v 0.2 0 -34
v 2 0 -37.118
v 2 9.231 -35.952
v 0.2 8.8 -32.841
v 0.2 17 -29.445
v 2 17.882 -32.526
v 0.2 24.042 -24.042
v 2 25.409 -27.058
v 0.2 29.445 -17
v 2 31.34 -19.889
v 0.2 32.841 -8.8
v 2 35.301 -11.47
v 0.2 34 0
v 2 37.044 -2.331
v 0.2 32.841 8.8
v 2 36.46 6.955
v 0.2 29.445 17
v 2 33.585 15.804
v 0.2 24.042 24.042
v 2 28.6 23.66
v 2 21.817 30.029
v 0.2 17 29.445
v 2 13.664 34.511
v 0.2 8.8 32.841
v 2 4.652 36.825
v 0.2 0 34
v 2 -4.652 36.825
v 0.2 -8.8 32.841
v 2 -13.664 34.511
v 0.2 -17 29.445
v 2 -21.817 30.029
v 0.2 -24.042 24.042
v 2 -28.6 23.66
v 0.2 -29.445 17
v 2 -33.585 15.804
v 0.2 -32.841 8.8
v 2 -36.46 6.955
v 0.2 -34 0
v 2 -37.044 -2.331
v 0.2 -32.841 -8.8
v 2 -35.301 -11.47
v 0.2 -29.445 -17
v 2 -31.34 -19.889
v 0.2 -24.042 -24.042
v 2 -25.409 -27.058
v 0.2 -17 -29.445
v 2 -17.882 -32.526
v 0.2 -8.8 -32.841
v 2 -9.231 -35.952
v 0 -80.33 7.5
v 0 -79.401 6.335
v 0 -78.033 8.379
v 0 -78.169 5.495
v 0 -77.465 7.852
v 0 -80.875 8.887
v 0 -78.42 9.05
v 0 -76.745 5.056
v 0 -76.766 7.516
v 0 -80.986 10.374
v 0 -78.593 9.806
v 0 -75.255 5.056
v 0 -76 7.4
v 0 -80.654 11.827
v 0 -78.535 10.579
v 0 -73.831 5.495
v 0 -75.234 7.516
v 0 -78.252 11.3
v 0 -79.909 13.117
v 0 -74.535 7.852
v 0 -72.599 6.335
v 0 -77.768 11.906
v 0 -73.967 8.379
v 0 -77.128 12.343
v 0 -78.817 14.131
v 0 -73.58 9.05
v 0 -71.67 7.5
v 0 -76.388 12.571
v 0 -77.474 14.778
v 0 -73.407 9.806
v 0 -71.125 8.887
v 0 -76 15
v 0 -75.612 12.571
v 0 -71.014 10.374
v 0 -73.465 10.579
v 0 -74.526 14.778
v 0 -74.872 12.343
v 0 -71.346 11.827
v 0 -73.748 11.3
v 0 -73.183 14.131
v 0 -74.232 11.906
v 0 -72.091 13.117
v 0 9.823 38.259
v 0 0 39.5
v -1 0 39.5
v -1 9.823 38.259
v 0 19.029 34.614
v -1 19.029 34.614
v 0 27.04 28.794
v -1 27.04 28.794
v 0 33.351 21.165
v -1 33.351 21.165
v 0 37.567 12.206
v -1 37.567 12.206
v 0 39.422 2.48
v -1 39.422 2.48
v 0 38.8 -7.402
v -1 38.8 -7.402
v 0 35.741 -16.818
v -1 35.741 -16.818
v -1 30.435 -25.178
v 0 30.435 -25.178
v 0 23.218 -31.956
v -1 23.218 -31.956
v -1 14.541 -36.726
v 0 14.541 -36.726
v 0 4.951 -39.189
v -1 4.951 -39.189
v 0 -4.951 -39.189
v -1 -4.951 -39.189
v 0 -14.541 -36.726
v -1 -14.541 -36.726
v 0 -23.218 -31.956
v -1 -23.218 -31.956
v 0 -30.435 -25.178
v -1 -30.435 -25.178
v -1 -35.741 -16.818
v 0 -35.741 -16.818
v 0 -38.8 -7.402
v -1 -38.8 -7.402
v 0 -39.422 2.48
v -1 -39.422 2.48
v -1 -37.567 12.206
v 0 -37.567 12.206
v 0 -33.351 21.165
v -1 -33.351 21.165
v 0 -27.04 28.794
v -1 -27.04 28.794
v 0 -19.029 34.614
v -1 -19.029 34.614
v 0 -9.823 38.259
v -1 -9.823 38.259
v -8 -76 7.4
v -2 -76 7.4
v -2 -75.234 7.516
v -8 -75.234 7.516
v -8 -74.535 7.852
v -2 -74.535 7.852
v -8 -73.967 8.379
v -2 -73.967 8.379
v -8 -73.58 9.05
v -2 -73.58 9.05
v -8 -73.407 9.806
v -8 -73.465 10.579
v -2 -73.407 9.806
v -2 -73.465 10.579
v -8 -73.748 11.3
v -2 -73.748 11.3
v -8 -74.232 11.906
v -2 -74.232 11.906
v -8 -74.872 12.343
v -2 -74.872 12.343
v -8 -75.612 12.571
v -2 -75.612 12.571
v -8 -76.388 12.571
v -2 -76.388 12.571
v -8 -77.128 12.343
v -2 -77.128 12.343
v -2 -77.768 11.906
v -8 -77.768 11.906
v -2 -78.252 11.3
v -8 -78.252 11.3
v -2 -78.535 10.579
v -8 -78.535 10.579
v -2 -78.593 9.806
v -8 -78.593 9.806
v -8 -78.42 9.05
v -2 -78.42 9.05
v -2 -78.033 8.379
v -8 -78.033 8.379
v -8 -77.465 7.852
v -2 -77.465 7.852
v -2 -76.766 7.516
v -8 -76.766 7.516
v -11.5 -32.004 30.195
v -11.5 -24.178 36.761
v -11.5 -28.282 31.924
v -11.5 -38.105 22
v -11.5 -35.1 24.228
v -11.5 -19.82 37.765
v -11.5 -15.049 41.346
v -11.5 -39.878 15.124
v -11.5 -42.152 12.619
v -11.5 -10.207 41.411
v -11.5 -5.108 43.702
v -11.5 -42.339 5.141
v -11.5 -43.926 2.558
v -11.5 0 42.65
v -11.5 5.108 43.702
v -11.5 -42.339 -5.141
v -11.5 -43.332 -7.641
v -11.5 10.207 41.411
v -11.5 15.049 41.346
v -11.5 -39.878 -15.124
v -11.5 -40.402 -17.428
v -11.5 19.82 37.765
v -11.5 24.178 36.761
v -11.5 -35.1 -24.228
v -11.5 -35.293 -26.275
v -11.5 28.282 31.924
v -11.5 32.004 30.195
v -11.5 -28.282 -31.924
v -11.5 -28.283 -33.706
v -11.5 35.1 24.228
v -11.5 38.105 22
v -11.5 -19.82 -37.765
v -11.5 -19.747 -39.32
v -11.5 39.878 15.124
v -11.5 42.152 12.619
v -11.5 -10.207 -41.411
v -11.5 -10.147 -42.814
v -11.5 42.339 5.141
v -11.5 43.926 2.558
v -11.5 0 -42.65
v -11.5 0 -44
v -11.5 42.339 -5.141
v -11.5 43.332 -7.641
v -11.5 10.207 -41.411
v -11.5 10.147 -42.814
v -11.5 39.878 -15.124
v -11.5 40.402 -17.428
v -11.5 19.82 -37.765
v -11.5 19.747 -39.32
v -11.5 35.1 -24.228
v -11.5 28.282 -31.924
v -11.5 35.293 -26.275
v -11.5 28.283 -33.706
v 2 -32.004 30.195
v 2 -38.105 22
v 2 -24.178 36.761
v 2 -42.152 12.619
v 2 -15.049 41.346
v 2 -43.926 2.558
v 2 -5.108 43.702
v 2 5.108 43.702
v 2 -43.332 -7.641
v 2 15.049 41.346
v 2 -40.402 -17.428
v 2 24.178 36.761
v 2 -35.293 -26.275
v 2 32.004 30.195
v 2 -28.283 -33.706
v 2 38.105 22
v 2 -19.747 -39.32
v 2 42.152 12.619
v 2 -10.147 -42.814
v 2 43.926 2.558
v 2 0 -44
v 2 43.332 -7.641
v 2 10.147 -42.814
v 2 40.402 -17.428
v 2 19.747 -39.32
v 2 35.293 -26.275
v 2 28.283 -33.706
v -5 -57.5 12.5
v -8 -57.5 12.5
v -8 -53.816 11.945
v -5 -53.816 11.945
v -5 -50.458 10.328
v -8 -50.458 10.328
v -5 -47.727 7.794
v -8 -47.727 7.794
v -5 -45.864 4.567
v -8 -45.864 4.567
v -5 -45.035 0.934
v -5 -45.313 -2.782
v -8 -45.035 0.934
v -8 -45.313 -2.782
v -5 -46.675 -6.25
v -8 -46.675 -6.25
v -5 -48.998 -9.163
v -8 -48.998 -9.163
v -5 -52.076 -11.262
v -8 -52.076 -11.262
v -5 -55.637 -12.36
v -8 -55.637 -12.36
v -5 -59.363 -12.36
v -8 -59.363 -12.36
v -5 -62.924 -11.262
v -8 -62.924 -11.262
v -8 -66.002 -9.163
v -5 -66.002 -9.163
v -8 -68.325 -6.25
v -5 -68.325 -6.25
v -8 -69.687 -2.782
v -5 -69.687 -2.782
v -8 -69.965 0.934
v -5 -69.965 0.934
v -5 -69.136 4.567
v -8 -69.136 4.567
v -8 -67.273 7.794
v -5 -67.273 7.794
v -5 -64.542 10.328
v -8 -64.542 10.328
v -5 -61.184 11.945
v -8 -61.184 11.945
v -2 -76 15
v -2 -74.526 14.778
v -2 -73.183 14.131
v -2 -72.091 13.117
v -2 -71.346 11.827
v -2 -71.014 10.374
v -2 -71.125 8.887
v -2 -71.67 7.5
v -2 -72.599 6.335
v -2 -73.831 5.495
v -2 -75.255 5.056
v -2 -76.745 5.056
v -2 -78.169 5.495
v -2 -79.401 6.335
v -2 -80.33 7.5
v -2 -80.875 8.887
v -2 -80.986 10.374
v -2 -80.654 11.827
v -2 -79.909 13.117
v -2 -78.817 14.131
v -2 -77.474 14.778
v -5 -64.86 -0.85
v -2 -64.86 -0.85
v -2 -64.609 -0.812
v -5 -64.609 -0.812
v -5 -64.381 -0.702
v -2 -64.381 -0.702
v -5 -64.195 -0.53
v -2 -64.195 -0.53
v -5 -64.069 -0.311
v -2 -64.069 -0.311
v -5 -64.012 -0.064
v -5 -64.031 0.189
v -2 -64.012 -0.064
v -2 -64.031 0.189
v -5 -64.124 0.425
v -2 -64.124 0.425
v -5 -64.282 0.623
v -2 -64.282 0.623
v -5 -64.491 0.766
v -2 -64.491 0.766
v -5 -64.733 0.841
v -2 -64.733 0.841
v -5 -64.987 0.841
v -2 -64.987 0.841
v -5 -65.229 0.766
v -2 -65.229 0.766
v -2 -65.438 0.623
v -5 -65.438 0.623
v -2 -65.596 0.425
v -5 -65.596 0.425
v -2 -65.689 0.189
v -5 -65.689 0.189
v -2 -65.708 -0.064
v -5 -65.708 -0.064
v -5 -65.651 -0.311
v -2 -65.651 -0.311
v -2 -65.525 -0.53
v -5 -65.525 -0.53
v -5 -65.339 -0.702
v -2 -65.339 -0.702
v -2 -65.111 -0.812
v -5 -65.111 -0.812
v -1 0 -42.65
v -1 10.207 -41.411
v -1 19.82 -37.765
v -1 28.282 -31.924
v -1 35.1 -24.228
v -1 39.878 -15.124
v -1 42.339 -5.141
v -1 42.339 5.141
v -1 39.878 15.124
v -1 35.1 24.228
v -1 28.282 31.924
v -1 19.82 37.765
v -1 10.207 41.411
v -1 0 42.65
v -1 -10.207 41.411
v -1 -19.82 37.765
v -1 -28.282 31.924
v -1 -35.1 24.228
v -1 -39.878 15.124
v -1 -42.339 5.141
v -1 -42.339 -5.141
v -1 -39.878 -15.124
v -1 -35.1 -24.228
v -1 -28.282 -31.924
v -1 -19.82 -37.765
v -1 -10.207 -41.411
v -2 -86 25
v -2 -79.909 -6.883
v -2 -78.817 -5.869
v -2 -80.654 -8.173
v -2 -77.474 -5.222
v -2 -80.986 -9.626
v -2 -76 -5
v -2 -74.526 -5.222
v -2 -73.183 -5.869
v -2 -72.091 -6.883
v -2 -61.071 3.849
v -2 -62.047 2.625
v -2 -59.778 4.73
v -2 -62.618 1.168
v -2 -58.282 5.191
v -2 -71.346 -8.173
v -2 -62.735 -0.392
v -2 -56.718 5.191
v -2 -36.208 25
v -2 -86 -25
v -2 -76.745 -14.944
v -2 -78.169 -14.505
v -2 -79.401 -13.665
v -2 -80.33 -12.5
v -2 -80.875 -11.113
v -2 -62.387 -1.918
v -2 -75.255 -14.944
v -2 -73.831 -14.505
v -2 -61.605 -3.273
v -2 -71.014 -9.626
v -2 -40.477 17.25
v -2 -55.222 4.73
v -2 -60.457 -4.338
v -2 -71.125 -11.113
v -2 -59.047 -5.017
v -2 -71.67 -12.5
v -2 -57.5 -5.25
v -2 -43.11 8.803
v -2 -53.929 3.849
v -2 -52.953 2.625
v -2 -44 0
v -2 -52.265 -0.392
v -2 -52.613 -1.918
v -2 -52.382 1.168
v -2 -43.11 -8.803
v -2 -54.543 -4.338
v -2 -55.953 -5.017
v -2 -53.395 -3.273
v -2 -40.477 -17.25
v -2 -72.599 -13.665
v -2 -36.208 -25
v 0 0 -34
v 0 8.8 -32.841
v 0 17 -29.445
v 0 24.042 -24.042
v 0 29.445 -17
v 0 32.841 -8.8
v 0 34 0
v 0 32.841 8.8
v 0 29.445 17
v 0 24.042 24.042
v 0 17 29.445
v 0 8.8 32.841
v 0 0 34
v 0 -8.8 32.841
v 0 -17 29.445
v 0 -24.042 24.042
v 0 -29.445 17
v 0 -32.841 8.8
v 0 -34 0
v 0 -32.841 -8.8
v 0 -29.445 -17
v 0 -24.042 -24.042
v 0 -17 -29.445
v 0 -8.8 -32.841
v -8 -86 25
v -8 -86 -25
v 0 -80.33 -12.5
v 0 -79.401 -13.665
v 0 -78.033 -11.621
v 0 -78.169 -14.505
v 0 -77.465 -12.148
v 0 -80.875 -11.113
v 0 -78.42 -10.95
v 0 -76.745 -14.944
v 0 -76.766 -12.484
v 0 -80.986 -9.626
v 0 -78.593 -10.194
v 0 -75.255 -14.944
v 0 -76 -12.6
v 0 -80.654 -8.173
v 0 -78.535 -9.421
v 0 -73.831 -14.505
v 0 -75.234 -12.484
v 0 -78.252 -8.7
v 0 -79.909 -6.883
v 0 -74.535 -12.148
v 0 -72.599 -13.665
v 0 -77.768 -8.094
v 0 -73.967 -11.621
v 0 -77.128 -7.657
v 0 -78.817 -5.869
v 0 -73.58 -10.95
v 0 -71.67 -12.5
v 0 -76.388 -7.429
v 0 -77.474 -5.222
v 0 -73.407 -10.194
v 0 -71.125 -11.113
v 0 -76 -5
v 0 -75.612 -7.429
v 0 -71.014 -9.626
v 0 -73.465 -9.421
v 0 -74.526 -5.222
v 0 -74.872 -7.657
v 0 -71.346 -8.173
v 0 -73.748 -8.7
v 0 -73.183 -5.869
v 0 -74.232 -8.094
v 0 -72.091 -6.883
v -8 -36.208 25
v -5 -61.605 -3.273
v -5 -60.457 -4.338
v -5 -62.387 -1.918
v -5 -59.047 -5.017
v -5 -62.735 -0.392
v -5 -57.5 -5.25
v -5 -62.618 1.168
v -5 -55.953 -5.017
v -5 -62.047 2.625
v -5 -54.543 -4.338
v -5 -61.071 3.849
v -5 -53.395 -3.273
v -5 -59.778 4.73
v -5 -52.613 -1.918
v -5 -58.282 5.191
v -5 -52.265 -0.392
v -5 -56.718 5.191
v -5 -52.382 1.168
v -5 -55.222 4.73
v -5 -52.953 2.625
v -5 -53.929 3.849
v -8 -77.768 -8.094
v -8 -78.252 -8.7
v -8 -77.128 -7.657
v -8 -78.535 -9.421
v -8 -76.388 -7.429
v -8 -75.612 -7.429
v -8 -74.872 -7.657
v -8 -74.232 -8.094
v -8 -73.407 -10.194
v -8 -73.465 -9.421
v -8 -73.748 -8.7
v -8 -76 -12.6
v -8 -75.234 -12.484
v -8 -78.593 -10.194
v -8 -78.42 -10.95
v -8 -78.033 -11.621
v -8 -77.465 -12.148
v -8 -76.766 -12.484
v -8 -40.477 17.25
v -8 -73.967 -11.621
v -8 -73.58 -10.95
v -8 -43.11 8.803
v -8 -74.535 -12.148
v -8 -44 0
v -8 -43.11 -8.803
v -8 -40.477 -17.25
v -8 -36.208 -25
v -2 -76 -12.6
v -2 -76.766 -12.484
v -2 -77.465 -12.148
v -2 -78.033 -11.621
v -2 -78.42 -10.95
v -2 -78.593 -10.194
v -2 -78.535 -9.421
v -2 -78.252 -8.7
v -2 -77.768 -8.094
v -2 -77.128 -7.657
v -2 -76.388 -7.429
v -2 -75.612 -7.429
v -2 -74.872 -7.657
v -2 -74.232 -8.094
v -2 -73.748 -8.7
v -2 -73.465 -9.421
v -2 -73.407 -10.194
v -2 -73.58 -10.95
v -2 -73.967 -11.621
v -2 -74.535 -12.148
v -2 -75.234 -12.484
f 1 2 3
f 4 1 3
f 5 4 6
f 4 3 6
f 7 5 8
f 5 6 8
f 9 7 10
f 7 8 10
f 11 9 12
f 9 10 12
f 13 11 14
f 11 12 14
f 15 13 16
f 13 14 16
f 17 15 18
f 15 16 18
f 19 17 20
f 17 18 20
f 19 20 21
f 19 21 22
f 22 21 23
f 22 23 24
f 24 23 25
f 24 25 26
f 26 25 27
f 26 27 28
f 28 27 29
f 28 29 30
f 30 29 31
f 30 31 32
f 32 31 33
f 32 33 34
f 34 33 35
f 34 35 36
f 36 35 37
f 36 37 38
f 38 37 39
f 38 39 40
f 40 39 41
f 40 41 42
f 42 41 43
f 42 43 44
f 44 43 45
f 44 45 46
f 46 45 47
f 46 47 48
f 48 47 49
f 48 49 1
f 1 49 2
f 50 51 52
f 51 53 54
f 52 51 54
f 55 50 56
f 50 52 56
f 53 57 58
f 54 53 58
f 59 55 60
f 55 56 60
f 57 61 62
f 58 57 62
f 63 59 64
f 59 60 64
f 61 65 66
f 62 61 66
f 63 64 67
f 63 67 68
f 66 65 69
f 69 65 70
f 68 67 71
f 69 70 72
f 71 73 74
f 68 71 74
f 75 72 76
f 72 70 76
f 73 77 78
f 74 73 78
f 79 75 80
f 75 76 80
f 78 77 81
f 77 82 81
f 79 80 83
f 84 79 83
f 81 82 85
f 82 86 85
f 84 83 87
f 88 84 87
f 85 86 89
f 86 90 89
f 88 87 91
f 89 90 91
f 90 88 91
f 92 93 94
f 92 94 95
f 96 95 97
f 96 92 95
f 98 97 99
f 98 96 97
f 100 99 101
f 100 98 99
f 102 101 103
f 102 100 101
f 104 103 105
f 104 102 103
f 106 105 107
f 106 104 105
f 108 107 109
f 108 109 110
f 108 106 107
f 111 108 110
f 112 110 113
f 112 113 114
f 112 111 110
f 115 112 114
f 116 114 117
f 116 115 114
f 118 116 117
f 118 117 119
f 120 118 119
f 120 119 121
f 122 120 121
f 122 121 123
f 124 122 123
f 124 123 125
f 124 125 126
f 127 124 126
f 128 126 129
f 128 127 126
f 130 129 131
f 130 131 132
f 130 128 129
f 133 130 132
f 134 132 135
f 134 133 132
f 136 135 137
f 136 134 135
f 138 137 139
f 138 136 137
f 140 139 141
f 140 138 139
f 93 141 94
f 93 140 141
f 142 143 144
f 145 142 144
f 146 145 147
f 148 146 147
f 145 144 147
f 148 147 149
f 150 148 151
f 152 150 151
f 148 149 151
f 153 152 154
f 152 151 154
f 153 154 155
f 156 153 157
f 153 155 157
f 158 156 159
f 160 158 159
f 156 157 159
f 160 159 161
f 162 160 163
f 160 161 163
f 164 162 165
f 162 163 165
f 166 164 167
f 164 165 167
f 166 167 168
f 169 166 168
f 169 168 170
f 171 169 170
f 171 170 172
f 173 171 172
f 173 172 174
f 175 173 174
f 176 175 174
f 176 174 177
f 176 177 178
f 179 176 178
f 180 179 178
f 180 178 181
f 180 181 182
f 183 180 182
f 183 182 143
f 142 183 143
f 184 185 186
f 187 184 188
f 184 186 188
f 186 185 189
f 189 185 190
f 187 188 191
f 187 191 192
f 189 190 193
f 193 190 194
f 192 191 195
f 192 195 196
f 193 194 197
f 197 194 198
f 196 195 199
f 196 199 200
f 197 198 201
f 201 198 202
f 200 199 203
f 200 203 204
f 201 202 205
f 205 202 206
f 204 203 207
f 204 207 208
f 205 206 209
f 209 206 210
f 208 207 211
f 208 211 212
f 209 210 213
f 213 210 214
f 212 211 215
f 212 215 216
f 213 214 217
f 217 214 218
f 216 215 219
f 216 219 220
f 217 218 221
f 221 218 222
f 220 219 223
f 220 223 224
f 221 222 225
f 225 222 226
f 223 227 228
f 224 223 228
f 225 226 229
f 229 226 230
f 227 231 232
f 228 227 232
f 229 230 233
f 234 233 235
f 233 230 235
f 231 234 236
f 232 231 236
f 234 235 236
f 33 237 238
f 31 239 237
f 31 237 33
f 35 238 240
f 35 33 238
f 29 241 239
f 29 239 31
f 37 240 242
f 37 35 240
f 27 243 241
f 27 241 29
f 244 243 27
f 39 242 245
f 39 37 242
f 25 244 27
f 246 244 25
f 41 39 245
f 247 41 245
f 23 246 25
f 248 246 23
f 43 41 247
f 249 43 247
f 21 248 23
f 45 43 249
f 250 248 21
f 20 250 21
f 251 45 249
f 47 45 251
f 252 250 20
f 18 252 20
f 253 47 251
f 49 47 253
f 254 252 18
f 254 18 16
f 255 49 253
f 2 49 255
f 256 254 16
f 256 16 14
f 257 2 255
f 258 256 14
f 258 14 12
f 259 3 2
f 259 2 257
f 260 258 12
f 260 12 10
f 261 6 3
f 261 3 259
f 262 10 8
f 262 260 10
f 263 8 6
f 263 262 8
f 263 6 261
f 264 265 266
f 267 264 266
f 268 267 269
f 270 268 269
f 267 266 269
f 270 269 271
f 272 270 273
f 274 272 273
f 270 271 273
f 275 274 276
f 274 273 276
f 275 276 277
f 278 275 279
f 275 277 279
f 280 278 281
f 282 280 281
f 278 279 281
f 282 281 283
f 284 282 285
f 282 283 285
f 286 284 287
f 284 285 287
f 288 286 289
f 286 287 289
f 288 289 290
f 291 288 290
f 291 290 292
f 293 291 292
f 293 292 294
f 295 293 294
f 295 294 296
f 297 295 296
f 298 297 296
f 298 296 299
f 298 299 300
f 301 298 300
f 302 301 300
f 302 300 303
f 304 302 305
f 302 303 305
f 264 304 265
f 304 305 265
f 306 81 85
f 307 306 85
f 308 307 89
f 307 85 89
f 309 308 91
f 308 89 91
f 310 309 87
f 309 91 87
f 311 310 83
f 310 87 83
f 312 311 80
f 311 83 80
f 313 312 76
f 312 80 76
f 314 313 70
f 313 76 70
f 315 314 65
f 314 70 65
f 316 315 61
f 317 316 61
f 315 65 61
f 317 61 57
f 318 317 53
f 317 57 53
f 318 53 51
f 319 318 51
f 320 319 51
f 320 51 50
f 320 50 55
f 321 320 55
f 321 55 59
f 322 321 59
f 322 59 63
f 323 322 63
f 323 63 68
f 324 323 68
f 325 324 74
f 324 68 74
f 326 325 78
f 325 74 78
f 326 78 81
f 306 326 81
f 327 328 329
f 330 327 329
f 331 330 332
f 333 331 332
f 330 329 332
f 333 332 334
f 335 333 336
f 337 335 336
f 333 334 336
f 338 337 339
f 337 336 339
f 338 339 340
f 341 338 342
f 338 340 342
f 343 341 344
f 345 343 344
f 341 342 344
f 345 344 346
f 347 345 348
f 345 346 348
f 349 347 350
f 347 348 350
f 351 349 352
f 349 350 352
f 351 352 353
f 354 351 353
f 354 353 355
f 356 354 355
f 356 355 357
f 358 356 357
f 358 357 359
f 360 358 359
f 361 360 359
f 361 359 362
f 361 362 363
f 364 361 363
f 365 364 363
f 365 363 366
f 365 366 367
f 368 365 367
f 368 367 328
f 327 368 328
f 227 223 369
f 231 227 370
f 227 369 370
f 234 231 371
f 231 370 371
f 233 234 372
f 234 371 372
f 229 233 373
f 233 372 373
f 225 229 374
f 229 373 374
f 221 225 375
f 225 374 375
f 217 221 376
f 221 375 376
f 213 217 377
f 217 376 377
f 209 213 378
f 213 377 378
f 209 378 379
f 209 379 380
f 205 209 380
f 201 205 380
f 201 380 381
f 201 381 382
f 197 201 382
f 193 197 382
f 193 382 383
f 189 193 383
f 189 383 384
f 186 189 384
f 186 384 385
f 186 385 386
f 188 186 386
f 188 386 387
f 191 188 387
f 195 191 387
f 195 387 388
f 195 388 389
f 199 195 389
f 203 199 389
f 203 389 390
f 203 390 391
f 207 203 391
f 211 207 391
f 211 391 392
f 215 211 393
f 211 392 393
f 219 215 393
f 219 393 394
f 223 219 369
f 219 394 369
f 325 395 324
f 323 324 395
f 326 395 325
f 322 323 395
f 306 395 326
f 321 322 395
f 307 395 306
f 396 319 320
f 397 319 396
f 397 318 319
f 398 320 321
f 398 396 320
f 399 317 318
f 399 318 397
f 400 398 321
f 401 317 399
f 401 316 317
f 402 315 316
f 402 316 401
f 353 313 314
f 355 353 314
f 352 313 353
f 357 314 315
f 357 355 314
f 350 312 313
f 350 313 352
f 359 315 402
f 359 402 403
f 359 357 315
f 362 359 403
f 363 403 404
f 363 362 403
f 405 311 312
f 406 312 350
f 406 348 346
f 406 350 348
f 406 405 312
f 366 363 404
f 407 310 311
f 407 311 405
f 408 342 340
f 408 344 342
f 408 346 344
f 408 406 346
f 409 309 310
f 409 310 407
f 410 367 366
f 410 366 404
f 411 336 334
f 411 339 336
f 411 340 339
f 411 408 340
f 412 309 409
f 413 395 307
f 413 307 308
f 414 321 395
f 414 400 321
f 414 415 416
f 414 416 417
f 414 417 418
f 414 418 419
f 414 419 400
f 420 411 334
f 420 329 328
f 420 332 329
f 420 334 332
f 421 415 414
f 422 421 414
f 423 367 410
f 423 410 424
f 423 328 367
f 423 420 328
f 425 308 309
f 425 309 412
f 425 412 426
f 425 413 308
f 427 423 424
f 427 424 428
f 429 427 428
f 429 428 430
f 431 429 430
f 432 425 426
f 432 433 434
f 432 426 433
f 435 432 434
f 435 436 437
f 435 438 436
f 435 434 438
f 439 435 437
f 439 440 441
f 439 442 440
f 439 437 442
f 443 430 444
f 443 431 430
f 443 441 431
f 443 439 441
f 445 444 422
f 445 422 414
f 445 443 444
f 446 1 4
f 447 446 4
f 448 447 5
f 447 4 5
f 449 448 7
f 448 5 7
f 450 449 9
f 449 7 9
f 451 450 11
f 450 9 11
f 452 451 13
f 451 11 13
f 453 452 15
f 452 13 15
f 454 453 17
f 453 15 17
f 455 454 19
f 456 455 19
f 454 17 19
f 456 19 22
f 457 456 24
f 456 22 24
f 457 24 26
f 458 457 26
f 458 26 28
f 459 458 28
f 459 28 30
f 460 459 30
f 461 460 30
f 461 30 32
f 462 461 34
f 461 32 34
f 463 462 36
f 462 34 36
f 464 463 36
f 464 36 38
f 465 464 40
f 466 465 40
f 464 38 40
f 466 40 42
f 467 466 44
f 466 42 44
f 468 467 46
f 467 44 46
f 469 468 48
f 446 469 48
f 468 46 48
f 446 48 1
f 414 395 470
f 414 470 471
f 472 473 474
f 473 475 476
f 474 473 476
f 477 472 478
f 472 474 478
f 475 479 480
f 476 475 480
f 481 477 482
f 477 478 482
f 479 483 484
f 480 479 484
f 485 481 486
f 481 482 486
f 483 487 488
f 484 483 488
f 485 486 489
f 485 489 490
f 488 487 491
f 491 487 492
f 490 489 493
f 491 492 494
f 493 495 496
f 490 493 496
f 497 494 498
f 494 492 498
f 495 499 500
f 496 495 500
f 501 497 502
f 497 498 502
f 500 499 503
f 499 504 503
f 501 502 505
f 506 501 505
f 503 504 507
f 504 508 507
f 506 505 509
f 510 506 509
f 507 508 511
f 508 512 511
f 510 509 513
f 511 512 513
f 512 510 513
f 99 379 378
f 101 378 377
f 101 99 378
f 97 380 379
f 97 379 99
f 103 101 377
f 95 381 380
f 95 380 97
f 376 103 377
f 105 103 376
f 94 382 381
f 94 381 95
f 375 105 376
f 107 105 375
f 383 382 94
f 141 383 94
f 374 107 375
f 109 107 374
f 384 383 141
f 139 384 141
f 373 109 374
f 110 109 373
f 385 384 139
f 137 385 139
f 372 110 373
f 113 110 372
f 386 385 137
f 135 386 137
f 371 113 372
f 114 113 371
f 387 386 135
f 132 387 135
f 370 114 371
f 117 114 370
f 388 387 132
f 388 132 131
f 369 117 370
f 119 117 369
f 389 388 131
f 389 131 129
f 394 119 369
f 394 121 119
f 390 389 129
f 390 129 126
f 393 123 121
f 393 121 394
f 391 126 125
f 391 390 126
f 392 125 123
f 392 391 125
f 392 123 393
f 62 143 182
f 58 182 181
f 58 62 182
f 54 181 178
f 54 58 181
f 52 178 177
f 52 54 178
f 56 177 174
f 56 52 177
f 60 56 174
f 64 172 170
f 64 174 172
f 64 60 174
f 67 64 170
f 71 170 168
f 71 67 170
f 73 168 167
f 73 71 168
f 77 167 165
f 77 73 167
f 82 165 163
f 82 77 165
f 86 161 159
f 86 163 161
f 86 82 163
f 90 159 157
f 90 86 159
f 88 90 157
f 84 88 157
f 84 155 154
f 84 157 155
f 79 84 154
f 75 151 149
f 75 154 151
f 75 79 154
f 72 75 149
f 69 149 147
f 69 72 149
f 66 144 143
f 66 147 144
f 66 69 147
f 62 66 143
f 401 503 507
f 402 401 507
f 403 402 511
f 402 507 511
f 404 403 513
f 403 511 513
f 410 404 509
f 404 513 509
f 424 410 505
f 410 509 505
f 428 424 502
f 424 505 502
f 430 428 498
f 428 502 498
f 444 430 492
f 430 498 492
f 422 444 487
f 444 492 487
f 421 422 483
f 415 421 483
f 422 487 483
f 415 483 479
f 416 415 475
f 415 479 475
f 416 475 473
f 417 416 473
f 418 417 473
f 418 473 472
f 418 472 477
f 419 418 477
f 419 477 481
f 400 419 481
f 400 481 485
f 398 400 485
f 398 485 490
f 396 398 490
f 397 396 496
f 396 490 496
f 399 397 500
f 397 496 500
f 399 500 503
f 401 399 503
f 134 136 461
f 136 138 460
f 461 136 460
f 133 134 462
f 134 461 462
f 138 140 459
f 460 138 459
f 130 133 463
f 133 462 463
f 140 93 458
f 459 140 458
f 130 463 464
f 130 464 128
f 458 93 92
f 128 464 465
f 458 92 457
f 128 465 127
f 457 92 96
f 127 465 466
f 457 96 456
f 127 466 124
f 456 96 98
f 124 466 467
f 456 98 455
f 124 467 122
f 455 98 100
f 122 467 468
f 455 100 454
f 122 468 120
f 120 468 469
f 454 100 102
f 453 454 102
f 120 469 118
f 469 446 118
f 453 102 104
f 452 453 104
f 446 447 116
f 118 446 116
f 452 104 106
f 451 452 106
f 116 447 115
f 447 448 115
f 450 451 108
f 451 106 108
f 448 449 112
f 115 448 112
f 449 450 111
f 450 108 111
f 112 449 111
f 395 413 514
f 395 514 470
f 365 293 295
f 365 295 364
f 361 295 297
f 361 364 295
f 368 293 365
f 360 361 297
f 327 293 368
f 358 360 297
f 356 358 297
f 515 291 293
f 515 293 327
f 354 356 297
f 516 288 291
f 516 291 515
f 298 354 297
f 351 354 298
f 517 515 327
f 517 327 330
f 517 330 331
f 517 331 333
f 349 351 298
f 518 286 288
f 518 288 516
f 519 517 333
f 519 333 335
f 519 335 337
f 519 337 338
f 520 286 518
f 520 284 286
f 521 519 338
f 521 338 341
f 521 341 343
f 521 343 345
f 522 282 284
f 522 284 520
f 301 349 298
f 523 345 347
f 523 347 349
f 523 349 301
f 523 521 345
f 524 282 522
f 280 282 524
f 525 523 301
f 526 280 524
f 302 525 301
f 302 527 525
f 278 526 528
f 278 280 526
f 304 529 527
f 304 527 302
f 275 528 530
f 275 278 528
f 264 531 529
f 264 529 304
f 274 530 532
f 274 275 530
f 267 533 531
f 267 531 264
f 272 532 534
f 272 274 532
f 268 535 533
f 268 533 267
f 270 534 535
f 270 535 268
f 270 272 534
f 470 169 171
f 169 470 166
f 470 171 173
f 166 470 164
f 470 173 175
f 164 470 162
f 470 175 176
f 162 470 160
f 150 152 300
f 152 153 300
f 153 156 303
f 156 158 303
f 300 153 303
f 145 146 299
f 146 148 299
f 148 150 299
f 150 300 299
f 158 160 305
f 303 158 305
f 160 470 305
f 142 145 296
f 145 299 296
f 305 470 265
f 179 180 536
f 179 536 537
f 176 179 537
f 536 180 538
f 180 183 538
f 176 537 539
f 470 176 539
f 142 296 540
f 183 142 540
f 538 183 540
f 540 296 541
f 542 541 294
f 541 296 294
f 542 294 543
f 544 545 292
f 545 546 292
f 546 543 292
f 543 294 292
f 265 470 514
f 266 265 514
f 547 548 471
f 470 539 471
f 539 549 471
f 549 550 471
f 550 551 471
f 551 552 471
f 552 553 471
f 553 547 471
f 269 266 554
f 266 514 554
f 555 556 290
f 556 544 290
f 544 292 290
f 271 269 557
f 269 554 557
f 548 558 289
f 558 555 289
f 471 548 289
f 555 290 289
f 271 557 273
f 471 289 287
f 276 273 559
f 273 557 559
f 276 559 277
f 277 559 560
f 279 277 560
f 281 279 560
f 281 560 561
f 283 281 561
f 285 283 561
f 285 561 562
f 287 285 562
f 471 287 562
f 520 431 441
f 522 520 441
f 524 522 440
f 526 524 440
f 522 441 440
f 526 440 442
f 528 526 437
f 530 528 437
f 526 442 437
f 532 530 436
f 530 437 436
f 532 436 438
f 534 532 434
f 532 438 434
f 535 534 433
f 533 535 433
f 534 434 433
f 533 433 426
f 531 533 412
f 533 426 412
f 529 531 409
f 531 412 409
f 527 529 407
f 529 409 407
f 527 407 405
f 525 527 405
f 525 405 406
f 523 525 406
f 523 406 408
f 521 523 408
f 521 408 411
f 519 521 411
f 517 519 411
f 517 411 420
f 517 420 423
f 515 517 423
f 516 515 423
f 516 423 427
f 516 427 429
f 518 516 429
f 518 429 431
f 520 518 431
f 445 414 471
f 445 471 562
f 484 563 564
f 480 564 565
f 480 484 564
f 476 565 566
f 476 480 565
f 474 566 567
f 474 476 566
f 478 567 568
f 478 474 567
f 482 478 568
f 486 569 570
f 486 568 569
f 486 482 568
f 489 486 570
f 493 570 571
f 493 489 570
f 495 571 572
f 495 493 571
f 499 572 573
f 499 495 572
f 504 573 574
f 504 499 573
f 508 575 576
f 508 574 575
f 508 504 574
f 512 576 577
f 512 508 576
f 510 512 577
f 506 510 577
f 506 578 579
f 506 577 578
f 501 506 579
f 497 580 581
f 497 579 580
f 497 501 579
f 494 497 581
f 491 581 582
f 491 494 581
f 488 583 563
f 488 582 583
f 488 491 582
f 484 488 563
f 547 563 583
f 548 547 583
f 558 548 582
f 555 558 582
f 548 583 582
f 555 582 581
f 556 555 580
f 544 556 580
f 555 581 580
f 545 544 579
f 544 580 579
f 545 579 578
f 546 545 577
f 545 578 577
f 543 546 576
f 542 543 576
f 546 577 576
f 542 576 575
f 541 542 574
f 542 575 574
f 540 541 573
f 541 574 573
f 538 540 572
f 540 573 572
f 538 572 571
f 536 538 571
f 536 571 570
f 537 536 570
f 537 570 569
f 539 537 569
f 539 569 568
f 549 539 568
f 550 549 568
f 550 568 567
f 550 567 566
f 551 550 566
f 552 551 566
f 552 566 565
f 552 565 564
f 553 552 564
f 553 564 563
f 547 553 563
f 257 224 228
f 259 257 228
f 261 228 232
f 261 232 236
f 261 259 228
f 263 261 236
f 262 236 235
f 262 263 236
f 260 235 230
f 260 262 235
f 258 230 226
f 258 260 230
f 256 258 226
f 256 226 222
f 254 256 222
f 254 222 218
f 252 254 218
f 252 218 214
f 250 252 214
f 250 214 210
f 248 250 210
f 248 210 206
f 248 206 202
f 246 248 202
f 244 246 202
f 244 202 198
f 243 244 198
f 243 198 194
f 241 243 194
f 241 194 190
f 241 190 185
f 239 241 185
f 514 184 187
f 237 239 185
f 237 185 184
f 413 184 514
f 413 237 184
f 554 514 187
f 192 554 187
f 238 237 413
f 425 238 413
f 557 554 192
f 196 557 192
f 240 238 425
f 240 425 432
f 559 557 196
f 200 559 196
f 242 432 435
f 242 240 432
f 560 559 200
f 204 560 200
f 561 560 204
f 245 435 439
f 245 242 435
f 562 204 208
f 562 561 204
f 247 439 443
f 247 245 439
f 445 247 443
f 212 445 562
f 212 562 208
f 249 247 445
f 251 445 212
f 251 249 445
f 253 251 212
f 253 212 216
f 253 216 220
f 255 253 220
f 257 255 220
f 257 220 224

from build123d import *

# Parameters (mm, degrees)
SKETCH1_R           = 44
SKETCH1_R_2         = 42.65
BOSS_EXTRUDE1_DEPTH = 11.5
BOSS_EXTRUDE2_START = 2
SKETCH1_2_R         = 44
SKETCH1_2_R_2       = 34
BOSS_EXTRUDE2_DEPTH = 2
BOSS_EXTRUDE3_DEPTH = 6
SKETCH7_R           = 42.65
SKETCH7_R_2         = 39.5
BOSS_EXTRUDE4_DEPTH = 1
SKETCH8_R           = 5.25
SKETCH8_R_2         = 0.85
SKETCH8_R_3         = 2.6
CUT_EXTRUDE3_DEPTH  = 10
SKETCH9_R           = 12.5
CUT_EXTRUDE4_DEPTH  = 3
CHAMFER1_SIZE       = 1.8
CHAMFER1_SIZE2      = 3.117691454
BOSS_EXTRUDE5_START = -2
SKETCH11_R          = 5
SKETCH11_R_2        = 2.6
BOSS_EXTRUDE5_DEPTH = 2


with BuildPart() as part:
    # Sketch1 → Boss-Extrude1 (new body)
    with BuildSketch(Plane(origin=(0, 0, 0), x_dir=(0, 0, -1), z_dir=(1, 0, 0))):
        Circle(SKETCH1_R)
        Circle(SKETCH1_R_2, mode=Mode.SUBTRACT)
    extrude(amount=-BOSS_EXTRUDE1_DEPTH)

    # Sketch1<2> → Boss-Extrude2 (add)
    with BuildSketch(Plane(origin=(0, 0, 0), x_dir=(0, 0, -1), z_dir=(1, 0, 0)).offset(BOSS_EXTRUDE2_START)):
        Circle(SKETCH1_2_R)
        Circle(SKETCH1_2_R_2, mode=Mode.SUBTRACT)
    extrude(amount=-BOSS_EXTRUDE2_DEPTH)

    # Sketch5 → Boss-Extrude3 (add)
    with BuildSketch(Plane(origin=(-2, 0, 0), x_dir=(0, 0, -1), z_dir=(1, 0, 0))):
        with BuildLine():
            Line((-25, -36.20773398), (-25, -86))
            Line((-25, -86), (25, -86))
            Line((25, -86), (25, -36.20773398))
            ThreePointArc((25, -36.20773398), (0, -44), (-25, -36.20773398))
        make_face()
    extrude(amount=-BOSS_EXTRUDE3_DEPTH)

    # Sketch7 → Boss-Extrude4 (add)
    with BuildSketch(Plane.ZY):
        Circle(SKETCH7_R)
        Circle(SKETCH7_R_2, mode=Mode.SUBTRACT)
    extrude(amount=BOSS_EXTRUDE4_DEPTH)

    # Sketch8 → Cut-Extrude3 (cut)
    with BuildSketch(Plane(origin=(-2, 0, 0), x_dir=(0, 0, -1), z_dir=(1, 0, 0))):
        with Locations((0, -57.5)):
            Circle(SKETCH8_R)
        with Locations((0, -64.86)):
            Circle(SKETCH8_R_2)
        with Locations((-10, -76)):
            Circle(SKETCH8_R_3)
        with Locations((10, -76)):
            Circle(SKETCH8_R_3)
    extrude(amount=-CUT_EXTRUDE3_DEPTH, mode=Mode.SUBTRACT)

    # Sketch9 → Cut-Extrude4 (cut)
    with BuildSketch(Plane.ZY.offset(8)):
        with Locations((0, -57.5)):
            Circle(SKETCH9_R)
    extrude(amount=-CUT_EXTRUDE4_DEPTH, mode=Mode.SUBTRACT)

    # Chamfer1
    chamfer1_edges = [part.edges().sort_by_distance(p)[0] for p in [
        (2, 0, 34),
    ]]
    chamfer1_side = [part.faces().sort_by_distance(p)[0] for p in [
        (1, 0, 34),
    ]]
    chamfer(chamfer1_edges, length=CHAMFER1_SIZE, length2=CHAMFER1_SIZE2, reference=chamfer1_side[0])

    # Sketch11 → Boss-Extrude5 (add)
    # profile 1 of 2: a face of its own
    with BuildSketch(Plane.ZY.offset(2).offset(BOSS_EXTRUDE5_START)):
        with Locations((-10, -76)):
            Circle(SKETCH11_R)
        with Locations((-10, -76)):
            Circle(SKETCH11_R_2, mode=Mode.SUBTRACT)
    # profile 2 of 2: a face of its own
    with BuildSketch(Plane.ZY.offset(2).offset(BOSS_EXTRUDE5_START)):
        with Locations((10, -76)):
            Circle(SKETCH11_R)
        with Locations((10, -76)):
            Circle(SKETCH11_R_2, mode=Mode.SUBTRACT)
    extrude(amount=BOSS_EXTRUDE5_DEPTH)


solid = part.part
